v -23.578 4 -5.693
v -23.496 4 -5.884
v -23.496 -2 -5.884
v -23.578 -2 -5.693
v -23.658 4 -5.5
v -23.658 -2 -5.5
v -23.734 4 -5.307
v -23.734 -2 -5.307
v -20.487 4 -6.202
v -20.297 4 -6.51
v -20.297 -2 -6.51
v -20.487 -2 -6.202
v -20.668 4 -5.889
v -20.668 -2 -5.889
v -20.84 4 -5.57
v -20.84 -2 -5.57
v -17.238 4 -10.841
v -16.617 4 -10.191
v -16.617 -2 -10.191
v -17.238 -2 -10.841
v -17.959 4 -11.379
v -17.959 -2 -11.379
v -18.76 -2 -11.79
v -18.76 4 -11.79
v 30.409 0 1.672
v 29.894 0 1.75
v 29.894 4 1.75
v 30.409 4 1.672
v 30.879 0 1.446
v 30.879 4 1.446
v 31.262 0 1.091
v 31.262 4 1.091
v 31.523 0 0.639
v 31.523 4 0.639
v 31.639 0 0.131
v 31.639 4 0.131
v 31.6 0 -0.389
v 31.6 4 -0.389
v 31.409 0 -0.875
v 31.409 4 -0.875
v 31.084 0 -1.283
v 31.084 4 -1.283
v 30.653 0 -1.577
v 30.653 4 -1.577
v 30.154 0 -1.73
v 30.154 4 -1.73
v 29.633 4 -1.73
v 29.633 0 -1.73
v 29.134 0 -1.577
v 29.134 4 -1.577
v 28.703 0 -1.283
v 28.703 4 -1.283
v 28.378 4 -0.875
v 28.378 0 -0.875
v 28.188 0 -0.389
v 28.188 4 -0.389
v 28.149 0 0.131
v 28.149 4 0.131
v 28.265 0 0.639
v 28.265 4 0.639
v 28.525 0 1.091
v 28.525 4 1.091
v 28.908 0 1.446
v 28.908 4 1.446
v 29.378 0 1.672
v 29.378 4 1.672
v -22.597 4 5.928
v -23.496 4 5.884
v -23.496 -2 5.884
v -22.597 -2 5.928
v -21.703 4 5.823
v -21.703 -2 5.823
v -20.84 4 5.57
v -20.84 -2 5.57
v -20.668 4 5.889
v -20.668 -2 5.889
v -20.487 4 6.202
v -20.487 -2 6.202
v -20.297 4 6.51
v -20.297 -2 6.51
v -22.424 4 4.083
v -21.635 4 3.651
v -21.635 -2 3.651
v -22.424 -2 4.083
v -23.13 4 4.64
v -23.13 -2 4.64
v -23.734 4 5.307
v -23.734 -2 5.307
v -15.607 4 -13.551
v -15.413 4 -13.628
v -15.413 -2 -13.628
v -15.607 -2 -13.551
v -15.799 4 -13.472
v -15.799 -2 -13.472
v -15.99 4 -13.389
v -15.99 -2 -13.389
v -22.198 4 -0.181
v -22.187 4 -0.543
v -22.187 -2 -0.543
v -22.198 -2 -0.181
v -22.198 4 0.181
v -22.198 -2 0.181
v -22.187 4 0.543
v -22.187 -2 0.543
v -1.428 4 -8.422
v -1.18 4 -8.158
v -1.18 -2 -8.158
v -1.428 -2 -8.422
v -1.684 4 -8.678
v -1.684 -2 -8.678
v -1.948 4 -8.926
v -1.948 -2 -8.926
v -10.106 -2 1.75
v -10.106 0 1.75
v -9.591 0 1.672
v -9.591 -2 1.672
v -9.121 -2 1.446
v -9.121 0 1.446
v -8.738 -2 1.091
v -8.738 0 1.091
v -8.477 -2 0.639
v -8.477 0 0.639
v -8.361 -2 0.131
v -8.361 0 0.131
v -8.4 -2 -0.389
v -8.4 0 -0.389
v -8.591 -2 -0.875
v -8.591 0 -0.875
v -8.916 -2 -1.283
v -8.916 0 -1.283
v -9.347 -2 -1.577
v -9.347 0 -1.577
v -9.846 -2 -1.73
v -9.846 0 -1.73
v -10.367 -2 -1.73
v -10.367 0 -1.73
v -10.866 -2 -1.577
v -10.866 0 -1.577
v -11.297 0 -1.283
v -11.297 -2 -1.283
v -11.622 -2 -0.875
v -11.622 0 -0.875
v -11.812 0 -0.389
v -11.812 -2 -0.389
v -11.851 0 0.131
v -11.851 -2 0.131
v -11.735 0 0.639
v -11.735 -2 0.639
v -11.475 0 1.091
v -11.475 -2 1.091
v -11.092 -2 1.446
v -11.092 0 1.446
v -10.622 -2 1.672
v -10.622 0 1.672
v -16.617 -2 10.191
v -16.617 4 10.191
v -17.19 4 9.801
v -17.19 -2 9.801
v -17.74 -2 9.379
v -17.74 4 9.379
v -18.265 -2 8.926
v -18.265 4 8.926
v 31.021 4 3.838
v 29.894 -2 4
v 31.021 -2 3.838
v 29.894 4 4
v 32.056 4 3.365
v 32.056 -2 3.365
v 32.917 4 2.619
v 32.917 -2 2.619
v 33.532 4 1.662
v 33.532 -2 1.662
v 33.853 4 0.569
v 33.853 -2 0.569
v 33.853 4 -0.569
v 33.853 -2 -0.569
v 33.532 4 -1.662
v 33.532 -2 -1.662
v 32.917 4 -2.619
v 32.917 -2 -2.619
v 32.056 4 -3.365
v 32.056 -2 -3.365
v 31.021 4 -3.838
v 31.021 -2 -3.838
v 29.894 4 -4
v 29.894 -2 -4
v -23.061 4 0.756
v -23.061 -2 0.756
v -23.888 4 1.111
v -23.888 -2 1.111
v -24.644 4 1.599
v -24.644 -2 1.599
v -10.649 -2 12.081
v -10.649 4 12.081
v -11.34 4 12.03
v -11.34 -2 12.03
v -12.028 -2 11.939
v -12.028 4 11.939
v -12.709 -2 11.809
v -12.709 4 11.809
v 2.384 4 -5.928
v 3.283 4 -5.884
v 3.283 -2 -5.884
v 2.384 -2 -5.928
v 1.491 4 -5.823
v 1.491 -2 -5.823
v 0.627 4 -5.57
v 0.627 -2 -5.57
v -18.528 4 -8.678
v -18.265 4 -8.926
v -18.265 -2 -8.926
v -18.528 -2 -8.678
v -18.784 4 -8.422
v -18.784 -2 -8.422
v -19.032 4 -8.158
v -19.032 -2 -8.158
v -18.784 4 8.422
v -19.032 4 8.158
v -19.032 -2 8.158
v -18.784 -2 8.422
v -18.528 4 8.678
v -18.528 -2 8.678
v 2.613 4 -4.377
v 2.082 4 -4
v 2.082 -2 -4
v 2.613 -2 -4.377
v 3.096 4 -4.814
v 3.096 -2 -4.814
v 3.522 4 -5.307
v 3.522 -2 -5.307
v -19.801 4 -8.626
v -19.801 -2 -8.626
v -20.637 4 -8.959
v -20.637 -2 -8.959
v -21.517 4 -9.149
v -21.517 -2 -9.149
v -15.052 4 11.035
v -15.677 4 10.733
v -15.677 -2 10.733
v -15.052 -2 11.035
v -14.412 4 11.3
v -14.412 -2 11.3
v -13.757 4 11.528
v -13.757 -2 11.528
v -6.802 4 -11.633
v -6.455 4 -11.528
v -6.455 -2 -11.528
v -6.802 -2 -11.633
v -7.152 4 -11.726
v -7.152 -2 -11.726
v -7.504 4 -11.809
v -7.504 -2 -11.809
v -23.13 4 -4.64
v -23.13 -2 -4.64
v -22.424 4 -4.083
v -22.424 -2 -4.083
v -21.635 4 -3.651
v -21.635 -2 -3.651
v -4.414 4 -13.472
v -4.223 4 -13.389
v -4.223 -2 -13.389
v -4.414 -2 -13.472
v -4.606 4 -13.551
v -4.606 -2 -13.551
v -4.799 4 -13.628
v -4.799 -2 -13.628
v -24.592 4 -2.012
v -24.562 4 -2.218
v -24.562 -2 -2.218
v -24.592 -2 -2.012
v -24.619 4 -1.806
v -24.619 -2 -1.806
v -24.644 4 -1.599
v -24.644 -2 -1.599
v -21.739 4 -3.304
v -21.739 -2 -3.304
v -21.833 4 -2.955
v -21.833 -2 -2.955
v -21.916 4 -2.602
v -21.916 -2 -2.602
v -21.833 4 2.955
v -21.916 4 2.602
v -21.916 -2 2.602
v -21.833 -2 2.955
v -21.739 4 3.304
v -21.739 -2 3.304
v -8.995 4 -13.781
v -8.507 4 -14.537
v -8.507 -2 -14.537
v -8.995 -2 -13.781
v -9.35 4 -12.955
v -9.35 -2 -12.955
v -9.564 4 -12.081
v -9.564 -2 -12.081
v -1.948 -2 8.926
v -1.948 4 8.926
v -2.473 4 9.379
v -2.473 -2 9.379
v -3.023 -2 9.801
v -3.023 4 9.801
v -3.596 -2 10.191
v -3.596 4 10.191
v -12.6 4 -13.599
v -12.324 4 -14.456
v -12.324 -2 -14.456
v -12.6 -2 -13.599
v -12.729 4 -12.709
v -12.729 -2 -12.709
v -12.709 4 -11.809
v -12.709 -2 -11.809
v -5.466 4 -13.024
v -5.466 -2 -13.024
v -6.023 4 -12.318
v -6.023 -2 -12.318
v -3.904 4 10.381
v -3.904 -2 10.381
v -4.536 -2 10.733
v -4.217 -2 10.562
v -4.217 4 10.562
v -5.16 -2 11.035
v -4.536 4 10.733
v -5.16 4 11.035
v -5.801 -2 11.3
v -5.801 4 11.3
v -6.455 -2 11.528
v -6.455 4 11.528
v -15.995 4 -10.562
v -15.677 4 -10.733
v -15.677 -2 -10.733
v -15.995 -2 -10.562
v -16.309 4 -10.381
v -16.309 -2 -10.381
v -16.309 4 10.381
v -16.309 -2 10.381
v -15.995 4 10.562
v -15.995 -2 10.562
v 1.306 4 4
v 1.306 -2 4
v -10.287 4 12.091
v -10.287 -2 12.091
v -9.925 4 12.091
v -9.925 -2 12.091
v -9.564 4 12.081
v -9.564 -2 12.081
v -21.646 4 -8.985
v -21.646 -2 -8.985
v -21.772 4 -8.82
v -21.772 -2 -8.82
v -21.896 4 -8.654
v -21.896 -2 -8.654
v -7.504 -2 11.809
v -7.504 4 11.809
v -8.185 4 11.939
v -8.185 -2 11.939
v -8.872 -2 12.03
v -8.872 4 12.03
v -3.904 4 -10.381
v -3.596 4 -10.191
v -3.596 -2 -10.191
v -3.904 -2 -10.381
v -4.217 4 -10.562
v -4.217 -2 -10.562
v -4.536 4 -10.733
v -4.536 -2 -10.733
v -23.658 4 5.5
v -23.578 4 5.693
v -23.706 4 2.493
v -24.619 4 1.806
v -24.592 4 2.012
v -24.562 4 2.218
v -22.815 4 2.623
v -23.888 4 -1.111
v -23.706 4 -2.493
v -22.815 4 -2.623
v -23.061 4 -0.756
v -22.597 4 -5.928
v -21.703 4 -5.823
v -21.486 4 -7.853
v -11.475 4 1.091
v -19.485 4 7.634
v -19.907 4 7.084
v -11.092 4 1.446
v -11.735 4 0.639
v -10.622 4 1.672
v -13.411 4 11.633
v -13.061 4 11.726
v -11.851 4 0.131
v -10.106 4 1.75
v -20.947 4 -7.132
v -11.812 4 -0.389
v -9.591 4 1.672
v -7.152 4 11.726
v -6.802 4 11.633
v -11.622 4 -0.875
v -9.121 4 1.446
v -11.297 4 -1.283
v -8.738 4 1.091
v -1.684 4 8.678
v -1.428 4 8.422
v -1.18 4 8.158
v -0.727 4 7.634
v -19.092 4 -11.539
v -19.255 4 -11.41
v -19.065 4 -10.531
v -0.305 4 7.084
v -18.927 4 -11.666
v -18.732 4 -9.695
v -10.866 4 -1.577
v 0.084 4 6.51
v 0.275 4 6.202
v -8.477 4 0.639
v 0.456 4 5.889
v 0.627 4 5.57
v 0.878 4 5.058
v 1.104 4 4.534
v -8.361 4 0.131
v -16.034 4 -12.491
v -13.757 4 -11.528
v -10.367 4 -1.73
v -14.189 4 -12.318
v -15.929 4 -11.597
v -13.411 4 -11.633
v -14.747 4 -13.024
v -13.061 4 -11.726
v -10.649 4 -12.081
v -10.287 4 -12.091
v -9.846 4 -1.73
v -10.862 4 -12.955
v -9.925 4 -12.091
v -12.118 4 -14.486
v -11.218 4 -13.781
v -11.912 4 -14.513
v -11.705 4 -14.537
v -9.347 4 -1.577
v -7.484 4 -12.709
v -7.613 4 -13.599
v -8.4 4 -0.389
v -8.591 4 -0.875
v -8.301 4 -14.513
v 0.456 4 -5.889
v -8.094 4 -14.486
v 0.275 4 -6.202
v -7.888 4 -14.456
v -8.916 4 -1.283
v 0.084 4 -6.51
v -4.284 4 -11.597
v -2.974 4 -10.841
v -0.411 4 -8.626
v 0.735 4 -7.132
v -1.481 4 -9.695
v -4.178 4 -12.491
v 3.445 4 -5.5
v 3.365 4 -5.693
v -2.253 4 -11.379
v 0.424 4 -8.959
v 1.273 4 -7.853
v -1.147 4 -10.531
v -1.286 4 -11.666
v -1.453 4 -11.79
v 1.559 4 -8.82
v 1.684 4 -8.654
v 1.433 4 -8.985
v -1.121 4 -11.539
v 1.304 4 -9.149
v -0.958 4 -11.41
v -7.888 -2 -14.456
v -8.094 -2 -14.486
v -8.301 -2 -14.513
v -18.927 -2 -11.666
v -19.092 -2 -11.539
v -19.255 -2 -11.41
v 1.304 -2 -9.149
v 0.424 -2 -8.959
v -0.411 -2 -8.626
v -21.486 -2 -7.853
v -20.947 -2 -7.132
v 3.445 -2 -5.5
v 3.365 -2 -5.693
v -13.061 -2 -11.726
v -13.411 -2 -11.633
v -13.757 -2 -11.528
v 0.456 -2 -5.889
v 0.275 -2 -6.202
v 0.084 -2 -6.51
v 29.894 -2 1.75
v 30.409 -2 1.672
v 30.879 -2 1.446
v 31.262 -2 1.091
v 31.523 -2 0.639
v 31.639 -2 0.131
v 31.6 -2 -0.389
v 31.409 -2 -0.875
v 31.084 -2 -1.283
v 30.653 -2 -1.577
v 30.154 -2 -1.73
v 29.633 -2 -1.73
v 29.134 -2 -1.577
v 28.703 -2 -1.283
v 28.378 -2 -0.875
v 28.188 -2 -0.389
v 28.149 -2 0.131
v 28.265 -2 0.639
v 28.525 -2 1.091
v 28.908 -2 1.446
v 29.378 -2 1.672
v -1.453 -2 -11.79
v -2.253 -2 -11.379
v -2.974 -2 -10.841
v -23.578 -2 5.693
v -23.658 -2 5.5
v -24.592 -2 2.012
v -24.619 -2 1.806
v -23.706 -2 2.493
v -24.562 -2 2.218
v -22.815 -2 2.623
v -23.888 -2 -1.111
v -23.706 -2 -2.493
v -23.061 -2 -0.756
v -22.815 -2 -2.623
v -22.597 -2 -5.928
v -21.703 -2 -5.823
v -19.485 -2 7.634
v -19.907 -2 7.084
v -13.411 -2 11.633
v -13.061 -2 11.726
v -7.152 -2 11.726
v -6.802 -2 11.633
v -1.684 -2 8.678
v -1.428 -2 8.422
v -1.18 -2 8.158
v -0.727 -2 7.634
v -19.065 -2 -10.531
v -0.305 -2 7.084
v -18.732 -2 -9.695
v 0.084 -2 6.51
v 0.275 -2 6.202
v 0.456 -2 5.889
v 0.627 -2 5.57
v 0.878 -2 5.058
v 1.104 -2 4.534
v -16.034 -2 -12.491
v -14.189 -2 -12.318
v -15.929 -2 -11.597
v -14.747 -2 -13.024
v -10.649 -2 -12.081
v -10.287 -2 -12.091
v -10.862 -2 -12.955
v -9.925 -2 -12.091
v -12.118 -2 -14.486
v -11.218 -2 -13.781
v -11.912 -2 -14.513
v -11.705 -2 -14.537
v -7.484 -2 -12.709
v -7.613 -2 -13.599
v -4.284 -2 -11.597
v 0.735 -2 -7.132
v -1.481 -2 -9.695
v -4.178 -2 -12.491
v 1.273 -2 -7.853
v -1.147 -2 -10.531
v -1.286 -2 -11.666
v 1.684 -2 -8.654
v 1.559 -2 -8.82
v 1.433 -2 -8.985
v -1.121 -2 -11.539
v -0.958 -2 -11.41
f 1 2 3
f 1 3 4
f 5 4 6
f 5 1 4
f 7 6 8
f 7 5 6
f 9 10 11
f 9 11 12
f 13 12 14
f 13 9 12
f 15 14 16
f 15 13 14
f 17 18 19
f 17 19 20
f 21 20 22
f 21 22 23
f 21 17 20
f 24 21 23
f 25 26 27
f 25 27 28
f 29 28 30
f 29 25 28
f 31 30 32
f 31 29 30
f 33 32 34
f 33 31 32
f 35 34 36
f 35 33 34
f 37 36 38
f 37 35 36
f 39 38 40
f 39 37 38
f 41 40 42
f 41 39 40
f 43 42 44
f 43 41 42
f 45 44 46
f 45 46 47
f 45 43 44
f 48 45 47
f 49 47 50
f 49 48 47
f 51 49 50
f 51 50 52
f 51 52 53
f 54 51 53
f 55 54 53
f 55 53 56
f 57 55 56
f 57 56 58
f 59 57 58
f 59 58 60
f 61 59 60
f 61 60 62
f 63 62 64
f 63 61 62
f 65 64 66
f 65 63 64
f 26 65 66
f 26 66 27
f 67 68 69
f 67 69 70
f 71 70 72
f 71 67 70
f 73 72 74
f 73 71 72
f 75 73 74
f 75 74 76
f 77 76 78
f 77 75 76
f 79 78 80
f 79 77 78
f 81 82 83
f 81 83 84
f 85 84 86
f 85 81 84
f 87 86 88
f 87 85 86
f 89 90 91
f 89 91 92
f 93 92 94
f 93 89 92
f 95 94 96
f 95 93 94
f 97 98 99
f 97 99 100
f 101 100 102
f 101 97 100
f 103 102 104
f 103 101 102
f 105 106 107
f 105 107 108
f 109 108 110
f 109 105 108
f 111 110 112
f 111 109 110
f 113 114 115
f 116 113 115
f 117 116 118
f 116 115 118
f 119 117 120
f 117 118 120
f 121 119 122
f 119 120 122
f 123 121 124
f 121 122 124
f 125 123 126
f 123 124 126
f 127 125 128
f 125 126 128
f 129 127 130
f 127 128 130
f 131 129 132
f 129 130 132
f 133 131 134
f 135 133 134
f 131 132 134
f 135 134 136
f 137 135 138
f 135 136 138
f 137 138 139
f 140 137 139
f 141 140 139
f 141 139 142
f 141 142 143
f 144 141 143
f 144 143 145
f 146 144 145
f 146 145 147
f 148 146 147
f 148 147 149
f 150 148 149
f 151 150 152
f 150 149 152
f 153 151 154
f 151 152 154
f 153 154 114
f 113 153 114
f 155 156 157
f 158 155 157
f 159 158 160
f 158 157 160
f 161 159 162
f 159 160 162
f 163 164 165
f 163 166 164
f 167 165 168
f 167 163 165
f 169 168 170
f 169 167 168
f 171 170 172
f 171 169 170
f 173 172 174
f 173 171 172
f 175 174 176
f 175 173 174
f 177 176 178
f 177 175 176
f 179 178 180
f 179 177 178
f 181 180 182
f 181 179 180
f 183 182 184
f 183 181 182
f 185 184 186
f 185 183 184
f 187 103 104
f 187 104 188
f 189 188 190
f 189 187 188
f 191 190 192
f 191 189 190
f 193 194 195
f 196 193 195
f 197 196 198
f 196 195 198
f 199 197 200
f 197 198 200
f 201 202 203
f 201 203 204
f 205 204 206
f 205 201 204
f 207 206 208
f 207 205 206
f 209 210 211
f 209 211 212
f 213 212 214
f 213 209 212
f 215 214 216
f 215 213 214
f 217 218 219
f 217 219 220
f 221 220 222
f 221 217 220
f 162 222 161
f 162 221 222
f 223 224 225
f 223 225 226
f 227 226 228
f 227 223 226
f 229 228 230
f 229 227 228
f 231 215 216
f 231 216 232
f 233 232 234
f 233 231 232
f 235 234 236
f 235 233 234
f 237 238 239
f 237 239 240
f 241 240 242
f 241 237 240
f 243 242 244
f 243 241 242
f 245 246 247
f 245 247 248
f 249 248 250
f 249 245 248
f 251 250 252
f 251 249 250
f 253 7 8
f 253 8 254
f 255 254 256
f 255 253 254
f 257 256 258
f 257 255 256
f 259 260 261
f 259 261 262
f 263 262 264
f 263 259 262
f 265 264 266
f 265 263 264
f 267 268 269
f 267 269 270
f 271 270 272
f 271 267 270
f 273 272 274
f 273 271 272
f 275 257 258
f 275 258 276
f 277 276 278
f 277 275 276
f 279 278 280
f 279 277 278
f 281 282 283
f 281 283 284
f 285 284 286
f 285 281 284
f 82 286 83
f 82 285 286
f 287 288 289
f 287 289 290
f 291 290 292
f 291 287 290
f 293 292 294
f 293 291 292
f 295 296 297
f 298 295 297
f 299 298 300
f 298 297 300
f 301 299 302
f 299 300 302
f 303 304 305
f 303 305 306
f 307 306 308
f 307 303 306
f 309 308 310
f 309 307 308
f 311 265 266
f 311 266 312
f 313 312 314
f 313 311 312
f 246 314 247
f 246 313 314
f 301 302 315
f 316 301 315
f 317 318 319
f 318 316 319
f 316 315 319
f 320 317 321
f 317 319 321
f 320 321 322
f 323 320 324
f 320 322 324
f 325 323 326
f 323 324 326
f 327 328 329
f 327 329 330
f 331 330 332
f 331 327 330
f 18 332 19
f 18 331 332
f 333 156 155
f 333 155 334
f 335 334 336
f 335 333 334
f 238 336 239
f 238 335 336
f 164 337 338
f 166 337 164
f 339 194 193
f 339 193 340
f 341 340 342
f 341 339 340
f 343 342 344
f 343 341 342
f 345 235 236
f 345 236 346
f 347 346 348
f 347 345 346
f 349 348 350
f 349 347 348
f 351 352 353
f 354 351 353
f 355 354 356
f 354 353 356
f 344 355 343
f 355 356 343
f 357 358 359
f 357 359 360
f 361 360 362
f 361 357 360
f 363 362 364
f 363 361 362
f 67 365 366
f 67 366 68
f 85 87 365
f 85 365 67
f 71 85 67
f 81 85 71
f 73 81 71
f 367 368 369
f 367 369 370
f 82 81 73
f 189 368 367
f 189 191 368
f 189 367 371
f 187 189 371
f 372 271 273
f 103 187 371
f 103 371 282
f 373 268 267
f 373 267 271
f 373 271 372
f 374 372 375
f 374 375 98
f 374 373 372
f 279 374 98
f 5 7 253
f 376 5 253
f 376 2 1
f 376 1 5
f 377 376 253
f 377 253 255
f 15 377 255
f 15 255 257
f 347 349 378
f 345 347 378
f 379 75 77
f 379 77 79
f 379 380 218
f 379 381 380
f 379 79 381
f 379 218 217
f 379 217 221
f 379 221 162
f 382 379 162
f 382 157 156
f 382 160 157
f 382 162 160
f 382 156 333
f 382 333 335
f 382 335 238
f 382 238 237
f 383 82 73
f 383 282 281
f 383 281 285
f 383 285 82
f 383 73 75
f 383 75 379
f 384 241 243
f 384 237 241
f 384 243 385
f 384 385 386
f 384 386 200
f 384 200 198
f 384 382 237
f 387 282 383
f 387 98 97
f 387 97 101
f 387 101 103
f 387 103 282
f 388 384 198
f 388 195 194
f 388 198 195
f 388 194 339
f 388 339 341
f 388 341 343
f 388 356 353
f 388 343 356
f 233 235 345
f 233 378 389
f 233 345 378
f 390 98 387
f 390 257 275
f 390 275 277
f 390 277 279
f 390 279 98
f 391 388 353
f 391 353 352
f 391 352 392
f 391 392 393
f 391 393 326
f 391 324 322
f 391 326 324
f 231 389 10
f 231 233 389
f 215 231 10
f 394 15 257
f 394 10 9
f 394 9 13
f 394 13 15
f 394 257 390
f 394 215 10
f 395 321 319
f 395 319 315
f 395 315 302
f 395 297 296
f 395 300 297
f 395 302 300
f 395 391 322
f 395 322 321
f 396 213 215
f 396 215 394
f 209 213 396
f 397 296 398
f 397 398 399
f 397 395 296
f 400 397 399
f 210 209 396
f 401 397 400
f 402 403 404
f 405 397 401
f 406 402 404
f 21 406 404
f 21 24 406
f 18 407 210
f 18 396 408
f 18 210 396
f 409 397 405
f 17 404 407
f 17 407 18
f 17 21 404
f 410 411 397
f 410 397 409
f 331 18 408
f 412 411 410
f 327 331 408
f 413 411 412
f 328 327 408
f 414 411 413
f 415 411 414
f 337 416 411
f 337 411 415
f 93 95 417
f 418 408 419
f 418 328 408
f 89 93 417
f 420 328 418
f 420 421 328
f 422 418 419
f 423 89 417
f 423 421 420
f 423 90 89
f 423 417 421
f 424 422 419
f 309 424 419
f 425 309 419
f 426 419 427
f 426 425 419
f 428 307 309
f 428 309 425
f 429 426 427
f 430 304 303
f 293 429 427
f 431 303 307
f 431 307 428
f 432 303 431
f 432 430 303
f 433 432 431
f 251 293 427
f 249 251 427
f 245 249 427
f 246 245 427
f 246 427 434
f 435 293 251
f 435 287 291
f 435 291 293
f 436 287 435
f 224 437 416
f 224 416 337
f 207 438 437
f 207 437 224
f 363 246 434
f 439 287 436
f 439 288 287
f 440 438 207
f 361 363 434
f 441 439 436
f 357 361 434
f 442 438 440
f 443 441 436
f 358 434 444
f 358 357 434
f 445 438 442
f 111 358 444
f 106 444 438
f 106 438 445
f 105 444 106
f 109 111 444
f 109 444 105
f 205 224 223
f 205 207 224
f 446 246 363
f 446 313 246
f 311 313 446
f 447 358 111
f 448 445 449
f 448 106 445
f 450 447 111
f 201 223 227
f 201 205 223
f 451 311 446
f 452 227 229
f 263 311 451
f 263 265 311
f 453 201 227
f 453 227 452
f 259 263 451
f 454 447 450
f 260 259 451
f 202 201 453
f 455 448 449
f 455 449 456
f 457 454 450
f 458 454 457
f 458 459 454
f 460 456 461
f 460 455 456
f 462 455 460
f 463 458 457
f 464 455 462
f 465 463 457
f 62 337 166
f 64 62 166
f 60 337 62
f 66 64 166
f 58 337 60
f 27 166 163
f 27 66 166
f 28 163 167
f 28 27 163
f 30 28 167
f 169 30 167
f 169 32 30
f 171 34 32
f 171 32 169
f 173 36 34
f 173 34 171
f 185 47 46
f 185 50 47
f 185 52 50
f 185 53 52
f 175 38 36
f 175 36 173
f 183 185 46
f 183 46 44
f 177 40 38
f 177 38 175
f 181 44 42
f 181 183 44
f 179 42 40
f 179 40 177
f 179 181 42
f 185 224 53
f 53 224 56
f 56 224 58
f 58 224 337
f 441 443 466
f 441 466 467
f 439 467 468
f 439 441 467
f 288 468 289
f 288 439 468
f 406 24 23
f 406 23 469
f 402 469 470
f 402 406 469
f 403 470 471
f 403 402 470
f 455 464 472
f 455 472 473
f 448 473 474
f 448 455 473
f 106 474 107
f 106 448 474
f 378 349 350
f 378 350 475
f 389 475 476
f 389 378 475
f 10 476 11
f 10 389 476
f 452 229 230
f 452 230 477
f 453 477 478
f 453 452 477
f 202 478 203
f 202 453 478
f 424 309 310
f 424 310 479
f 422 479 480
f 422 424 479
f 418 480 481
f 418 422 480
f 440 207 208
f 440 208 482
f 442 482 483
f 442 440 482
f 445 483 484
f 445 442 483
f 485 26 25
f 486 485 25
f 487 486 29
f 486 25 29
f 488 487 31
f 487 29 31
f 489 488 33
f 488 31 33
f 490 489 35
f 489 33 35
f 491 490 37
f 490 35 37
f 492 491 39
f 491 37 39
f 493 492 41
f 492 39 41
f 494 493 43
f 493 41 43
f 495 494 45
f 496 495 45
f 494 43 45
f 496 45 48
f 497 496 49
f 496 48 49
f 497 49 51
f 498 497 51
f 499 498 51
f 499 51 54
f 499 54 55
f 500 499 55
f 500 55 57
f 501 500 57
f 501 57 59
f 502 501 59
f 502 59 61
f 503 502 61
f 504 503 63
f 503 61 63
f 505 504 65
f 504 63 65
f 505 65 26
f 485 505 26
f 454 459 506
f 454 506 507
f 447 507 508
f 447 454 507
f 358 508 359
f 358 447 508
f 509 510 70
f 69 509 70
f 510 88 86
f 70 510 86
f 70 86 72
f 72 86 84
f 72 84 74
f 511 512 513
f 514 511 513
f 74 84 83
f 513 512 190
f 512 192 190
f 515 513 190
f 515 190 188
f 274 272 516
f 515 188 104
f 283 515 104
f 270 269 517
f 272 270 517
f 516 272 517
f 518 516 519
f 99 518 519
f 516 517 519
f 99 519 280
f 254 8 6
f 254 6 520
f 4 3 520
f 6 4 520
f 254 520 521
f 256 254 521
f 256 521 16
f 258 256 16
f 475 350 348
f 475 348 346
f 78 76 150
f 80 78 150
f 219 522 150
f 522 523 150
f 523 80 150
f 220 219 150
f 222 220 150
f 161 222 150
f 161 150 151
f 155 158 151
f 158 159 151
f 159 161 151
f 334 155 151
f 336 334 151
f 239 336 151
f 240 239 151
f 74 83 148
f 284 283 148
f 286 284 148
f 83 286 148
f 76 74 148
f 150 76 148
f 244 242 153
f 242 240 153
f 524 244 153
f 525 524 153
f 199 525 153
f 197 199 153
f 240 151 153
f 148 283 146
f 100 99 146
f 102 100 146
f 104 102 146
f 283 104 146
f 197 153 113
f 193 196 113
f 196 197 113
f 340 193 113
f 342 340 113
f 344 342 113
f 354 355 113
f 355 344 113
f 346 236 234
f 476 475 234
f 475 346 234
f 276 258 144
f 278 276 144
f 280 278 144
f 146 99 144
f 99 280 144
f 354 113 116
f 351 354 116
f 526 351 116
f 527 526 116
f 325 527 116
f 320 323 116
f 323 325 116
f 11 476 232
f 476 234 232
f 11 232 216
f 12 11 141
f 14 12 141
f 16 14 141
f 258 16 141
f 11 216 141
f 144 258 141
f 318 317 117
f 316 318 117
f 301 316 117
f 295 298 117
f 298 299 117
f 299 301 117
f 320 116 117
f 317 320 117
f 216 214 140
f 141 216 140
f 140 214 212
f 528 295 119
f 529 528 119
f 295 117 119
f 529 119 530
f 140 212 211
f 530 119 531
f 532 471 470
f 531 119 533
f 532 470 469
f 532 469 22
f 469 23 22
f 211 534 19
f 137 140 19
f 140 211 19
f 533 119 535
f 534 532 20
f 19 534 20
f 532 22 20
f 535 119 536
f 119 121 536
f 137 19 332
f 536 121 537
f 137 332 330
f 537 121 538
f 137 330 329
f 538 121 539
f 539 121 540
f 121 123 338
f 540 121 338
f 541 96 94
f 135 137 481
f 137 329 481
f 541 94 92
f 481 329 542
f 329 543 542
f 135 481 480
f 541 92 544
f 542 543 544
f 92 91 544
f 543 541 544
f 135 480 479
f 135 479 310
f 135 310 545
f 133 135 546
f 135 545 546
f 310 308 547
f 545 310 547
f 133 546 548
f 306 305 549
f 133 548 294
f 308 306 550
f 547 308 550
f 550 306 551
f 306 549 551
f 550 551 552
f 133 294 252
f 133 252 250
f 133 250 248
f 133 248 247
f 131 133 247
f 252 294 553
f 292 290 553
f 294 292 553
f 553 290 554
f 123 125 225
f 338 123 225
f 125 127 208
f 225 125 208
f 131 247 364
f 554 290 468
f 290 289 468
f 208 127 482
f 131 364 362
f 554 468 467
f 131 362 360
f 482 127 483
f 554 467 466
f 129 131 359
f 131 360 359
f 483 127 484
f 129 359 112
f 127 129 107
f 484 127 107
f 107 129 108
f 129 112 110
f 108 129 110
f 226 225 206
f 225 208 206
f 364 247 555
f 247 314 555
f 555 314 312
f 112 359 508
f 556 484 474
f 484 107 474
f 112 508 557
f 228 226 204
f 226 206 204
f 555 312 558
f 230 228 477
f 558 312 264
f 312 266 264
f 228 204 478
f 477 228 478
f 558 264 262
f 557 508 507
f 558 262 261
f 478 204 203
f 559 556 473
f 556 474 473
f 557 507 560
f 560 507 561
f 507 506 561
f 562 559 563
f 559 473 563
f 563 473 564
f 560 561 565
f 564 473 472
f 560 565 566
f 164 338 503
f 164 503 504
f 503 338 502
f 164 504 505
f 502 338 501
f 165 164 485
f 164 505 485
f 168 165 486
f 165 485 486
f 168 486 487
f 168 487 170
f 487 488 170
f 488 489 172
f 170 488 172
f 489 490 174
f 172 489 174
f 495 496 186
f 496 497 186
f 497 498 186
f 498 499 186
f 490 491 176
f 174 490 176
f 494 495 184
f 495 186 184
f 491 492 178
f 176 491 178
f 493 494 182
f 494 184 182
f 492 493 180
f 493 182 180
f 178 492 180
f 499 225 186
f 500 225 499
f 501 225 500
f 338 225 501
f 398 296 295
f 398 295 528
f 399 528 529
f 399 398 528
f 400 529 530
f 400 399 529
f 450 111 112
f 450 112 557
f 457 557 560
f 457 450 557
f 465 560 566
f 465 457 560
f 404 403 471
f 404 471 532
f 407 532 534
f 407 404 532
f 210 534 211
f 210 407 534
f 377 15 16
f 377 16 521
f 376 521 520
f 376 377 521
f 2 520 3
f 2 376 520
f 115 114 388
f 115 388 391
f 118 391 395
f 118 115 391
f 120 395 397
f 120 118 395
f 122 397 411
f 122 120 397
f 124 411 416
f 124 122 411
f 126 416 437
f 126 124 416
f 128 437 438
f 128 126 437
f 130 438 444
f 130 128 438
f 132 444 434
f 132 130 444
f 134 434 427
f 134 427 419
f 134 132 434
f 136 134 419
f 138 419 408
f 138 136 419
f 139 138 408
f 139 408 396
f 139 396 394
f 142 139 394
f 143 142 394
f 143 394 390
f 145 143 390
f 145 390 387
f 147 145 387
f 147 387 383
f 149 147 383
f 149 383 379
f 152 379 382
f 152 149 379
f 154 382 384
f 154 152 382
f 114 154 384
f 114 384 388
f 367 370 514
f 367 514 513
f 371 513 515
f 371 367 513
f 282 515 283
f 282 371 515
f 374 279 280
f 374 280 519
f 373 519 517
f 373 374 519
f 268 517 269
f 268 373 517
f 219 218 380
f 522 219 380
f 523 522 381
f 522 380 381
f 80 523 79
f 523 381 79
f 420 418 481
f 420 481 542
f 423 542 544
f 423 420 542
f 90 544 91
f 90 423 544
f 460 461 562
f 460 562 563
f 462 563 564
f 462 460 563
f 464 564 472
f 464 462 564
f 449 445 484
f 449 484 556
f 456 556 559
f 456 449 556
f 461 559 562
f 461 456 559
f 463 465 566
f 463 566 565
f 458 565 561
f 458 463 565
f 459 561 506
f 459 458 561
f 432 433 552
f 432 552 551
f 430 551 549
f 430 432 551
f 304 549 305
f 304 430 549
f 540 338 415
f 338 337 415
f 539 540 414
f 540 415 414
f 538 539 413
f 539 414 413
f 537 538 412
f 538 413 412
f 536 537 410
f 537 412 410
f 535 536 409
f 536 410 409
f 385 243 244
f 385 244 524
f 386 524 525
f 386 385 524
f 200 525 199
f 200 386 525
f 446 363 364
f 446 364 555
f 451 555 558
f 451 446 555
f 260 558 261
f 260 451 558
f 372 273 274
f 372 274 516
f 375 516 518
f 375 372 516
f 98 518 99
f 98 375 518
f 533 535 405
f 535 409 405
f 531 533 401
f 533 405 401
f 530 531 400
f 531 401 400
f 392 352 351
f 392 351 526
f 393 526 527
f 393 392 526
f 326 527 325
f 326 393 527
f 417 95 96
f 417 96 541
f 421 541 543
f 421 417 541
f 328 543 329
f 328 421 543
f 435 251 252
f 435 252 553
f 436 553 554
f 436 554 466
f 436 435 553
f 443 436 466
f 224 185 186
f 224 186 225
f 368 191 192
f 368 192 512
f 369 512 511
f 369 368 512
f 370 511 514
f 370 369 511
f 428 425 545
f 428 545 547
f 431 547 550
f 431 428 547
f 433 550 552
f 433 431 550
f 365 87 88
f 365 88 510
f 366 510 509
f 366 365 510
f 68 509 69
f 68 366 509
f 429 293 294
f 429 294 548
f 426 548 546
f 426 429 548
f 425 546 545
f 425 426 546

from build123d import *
from build123d.topology import SkipClean

# Parameters (mm, degrees)
SKETCH1_R           = 1.75
BOSS_EXTRUDE1_DEPTH = 4
CUT_EXTRUDE1_START  = -10
CUT_EXTRUDE1_DEPTH  = 10
MOVE_FACE1_BY       = 2


with BuildPart() as part:
    # Sketch1 → Boss-Extrude1 (new body)
    with BuildSketch(Plane(origin=(0, 0, 0), x_dir=(1, 0, 0), z_dir=(0, 1, 0))):
        with BuildLine():
            Line((29.893657446, 4), (2.081641936, 4))
            ThreePointArc((2.081641936, 4), (2.861028333, 4.588201733), (3.521749436, 5.30713988))
            ThreePointArc((3.521749436, 5.30713988), (3.405395609, 5.596745198), (3.282888305, 5.883801663))
            ThreePointArc((3.282888305, 5.883801663), (1.93527598, 5.894040025), (0.627094961, 5.57027124))
            ThreePointArc((0.627094961, 5.57027124), (0.366286148, 6.046375), (0.084372603, 6.510293938))
            ThreePointArc((0.084372603, 6.510293938), (1.018855105, 7.48132754), (1.683794586, 8.65351323))
            ThreePointArc((1.683794586, 8.65351323), (1.496450048, 8.903135899), (1.303821399, 9.148703928))
            ThreePointArc((1.303821399, 9.148703928), (-0.000522033, 8.809805691), (-1.180330337, 8.158486898))
            ThreePointArc((-1.180330337, 8.158486898), (-1.555477026, 8.550865528), (-1.947855656, 8.926012217))
            ThreePointArc((-1.947855656, 8.926012217), (-1.296536862, 10.105820521), (-0.957638625, 11.410163953))
            ThreePointArc((-0.957638625, 11.410163953), (-1.203206655, 11.602792602), (-1.452829324, 11.79013714))
            ThreePointArc((-1.452829324, 11.79013714), (-2.625015014, 11.125197659), (-3.596048616, 10.190715157))
            ThreePointArc((-3.596048616, 10.190715157), (-4.059967554, 10.472628702), (-4.536071314, 10.733437515))
            ThreePointArc((-4.536071314, 10.733437515), (-4.212302529, 12.041618533), (-4.222540891, 13.389230859))
            ThreePointArc((-4.222540891, 13.389230859), (-4.509597355, 13.511738163), (-4.799202674, 13.62809199))
            ThreePointArc((-4.799202674, 13.62809199), (-5.759348103, 12.682425791), (-6.455432668, 11.528463019))
            ThreePointArc((-6.455432668, 11.528463019), (-6.976508546, 11.680699536), (-7.503891752, 11.809396783))
            ThreePointArc((-7.503891752, 11.809396783), (-7.529737283, 13.156800143), (-7.888414517, 14.455843809))
            ThreePointArc((-7.888414517, 14.455843809), (-8.197396993, 14.499881098), (-8.507248835, 14.537314892))
            ThreePointArc((-8.507248835, 14.537314892), (-9.18992168, 13.375367565), (-9.563620196, 12.080565177))
            ThreePointArc((-9.563620196, 12.080565177), (-10.106342554, 12.09275), (-10.649064912, 12.080565177))
            ThreePointArc((-10.649064912, 12.080565177), (-11.022763428, 13.375367565), (-11.705436272, 14.537314892))
            ThreePointArc((-11.705436272, 14.537314892), (-12.015288115, 14.499881098), (-12.324270591, 14.455843809))
            ThreePointArc((-12.324270591, 14.455843809), (-12.682947825, 13.156800143), (-12.708793355, 11.809396783))
            ThreePointArc((-12.708793355, 11.809396783), (-13.236176561, 11.680699536), (-13.757252439, 11.528463019))
            ThreePointArc((-13.757252439, 11.528463019), (-14.453337005, 12.682425791), (-15.413482434, 13.62809199))
            ThreePointArc((-15.413482434, 13.62809199), (-15.703087752, 13.511738163), (-15.990144217, 13.389230859))
            ThreePointArc((-15.990144217, 13.389230859), (-16.000382579, 12.041618533), (-15.676613793, 10.733437515))
            ThreePointArc((-15.676613793, 10.733437515), (-16.152717554, 10.472628702), (-16.616636492, 10.190715157))
            ThreePointArc((-16.616636492, 10.190715157), (-17.587670094, 11.125197659), (-18.759855783, 11.79013714))
            ThreePointArc((-18.759855783, 11.79013714), (-19.009478453, 11.602792602), (-19.255046482, 11.410163953))
            ThreePointArc((-19.255046482, 11.410163953), (-18.916148245, 10.105820521), (-18.264829452, 8.926012217))
            ThreePointArc((-18.264829452, 8.926012217), (-18.657208082, 8.550865528), (-19.032354771, 8.158486898))
            ThreePointArc((-19.032354771, 8.158486898), (-20.212163074, 8.809805691), (-21.516506507, 9.148703928))
            ThreePointArc((-21.516506507, 9.148703928), (-21.709135156, 8.903135899), (-21.896479694, 8.65351323))
            ThreePointArc((-21.896479694, 8.65351323), (-21.231540213, 7.48132754), (-20.297057711, 6.510293938))
            ThreePointArc((-20.297057711, 6.510293938), (-20.578971255, 6.046375), (-20.839780068, 5.57027124))
            ThreePointArc((-20.839780068, 5.57027124), (-22.147961087, 5.894040025), (-23.495573413, 5.883801663))
            ThreePointArc((-23.495573413, 5.883801663), (-23.618080717, 5.596745198), (-23.734434544, 5.30713988))
            ThreePointArc((-23.734434544, 5.30713988), (-22.788768345, 4.346994451), (-21.634805572, 3.650909885))
            ThreePointArc((-21.634805572, 3.650909885), (-21.78704209, 3.129834008), (-21.915739337, 2.602450802))
            ThreePointArc((-21.915739337, 2.602450802), (-23.263142697, 2.576605271), (-24.562186363, 2.217928037))
            ThreePointArc((-24.562186363, 2.217928037), (-24.606223651, 1.908945561), (-24.643657446, 1.599093719))
            ThreePointArc((-24.643657446, 1.599093719), (-23.481710119, 0.916420874), (-22.186907731, 0.542722358))
            ThreePointArc((-22.186907731, 0.542722358), (-22.199092554, 0), (-22.186907731, -0.542722358))
            ThreePointArc((-22.186907731, -0.542722358), (-23.481710119, -0.916420874), (-24.643657446, -1.599093719))
            ThreePointArc((-24.643657446, -1.599093719), (-24.606223651, -1.908945561), (-24.562186363, -2.217928037))
            ThreePointArc((-24.562186363, -2.217928037), (-23.263142697, -2.576605271), (-21.915739337, -2.602450802))
            ThreePointArc((-21.915739337, -2.602450802), (-21.78704209, -3.129834008), (-21.634805572, -3.650909885))
            ThreePointArc((-21.634805572, -3.650909885), (-22.788768345, -4.346994451), (-23.734434544, -5.30713988))
            ThreePointArc((-23.734434544, -5.30713988), (-23.618080717, -5.596745198), (-23.495573413, -5.883801663))
            ThreePointArc((-23.495573413, -5.883801663), (-22.147961087, -5.894040025), (-20.839780068, -5.57027124))
            ThreePointArc((-20.839780068, -5.57027124), (-20.578971255, -6.046375), (-20.297057711, -6.510293938))
            ThreePointArc((-20.297057711, -6.510293938), (-21.231540213, -7.48132754), (-21.896479694, -8.65351323))
            ThreePointArc((-21.896479694, -8.65351323), (-21.709135156, -8.903135899), (-21.516506507, -9.148703928))
            ThreePointArc((-21.516506507, -9.148703928), (-20.212163074, -8.809805691), (-19.032354771, -8.158486898))
            ThreePointArc((-19.032354771, -8.158486898), (-18.657208082, -8.550865528), (-18.264829452, -8.926012217))
            ThreePointArc((-18.264829452, -8.926012217), (-18.916148245, -10.105820521), (-19.255046482, -11.410163953))
            ThreePointArc((-19.255046482, -11.410163953), (-19.009478453, -11.602792602), (-18.759855783, -11.79013714))
            ThreePointArc((-18.759855783, -11.79013714), (-17.587670094, -11.125197659), (-16.616636492, -10.190715157))
            ThreePointArc((-16.616636492, -10.190715157), (-16.152717554, -10.472628702), (-15.676613793, -10.733437515))
            ThreePointArc((-15.676613793, -10.733437515), (-16.000382579, -12.041618533), (-15.990144217, -13.389230859))
            ThreePointArc((-15.990144217, -13.389230859), (-15.703087752, -13.511738163), (-15.413482434, -13.62809199))
            ThreePointArc((-15.413482434, -13.62809199), (-14.453337005, -12.682425791), (-13.757252439, -11.528463019))
            ThreePointArc((-13.757252439, -11.528463019), (-13.236176561, -11.680699536), (-12.708793355, -11.809396783))
            ThreePointArc((-12.708793355, -11.809396783), (-12.682947825, -13.156800143), (-12.324270591, -14.455843809))
            ThreePointArc((-12.324270591, -14.455843809), (-12.015288115, -14.499881098), (-11.705436272, -14.537314892))
            ThreePointArc((-11.705436272, -14.537314892), (-11.022763428, -13.375367565), (-10.649064912, -12.080565177))
            ThreePointArc((-10.649064912, -12.080565177), (-10.106342554, -12.09275), (-9.563620196, -12.080565177))
            ThreePointArc((-9.563620196, -12.080565177), (-9.18992168, -13.375367565), (-8.507248835, -14.537314892))
            ThreePointArc((-8.507248835, -14.537314892), (-8.197396993, -14.499881098), (-7.888414517, -14.455843809))
            ThreePointArc((-7.888414517, -14.455843809), (-7.529737283, -13.156800143), (-7.503891752, -11.809396783))
            ThreePointArc((-7.503891752, -11.809396783), (-6.976508546, -11.680699536), (-6.455432668, -11.528463019))
            ThreePointArc((-6.455432668, -11.528463019), (-5.759348103, -12.682425791), (-4.799202674, -13.62809199))
            ThreePointArc((-4.799202674, -13.62809199), (-4.509597355, -13.511738163), (-4.222540891, -13.389230859))
            ThreePointArc((-4.222540891, -13.389230859), (-4.212302529, -12.041618533), (-4.536071314, -10.733437515))
            ThreePointArc((-4.536071314, -10.733437515), (-4.059967554, -10.472628702), (-3.596048616, -10.190715157))
            ThreePointArc((-3.596048616, -10.190715157), (-2.625015014, -11.125197659), (-1.452829324, -11.79013714))
            ThreePointArc((-1.452829324, -11.79013714), (-1.203206655, -11.602792602), (-0.957638625, -11.410163953))
            ThreePointArc((-0.957638625, -11.410163953), (-1.296536862, -10.105820521), (-1.947855656, -8.926012217))
            ThreePointArc((-1.947855656, -8.926012217), (-1.555477026, -8.550865528), (-1.180330337, -8.158486898))
            ThreePointArc((-1.180330337, -8.158486898), (-0.000522033, -8.809805691), (1.303821399, -9.148703928))
            ThreePointArc((1.303821399, -9.148703928), (1.496450048, -8.903135899), (1.683794586, -8.65351323))
            ThreePointArc((1.683794586, -8.65351323), (1.018855105, -7.48132754), (0.084372603, -6.510293938))
            ThreePointArc((0.084372603, -6.510293938), (0.366286148, -6.046375), (0.627094961, -5.57027124))
            ThreePointArc((0.627094961, -5.57027124), (1.93527598, -5.894040025), (3.282888305, -5.883801663))
            ThreePointArc((3.282888305, -5.883801663), (3.405395609, -5.596745198), (3.521749436, -5.30713988))
            ThreePointArc((3.521749436, -5.30713988), (2.861028333, -4.588201733), (2.081641936, -4))
            Line((2.081641936, -4), (29.893658255, -4))
            ThreePointArc((29.893658255, -4), (33.893657446, 4.04e-07), (29.893657446, 4))
        make_face()
        with Locations(Location((-10.106342554, 0, 0), (0, 0, 270))):
            Circle(SKETCH1_R, mode=Mode.SUBTRACT)
        with Locations(Location((29.893657446, 0, 0), (0, 0, 270))):
            Circle(SKETCH1_R, mode=Mode.SUBTRACT)
    extrude(amount=BOSS_EXTRUDE1_DEPTH)

    # Sketch2 → Cut-Extrude1 (cut)
    with SkipClean():  # the faces are left unmerged after this step: merging them gives an invalid solid
        with BuildSketch(Plane(origin=(0, 4, 0), x_dir=(1, 0, 0), z_dir=(0, 1, 0)).offset(CUT_EXTRUDE1_START)):
            with BuildLine():
                ThreePointArc((-21.516506507, -9.148703928), (-20.212163074, -8.809805691), (-19.032354771, -8.158486898))
                ThreePointArc((-19.032354771, -8.158486898), (-19.70016616, -7.361599771), (-20.297057711, -6.510293938))
                ThreePointArc((-20.297057711, -6.510293938), (-21.231540213, -7.48132754), (-21.896479694, -8.65351323))
                ThreePointArc((-21.896479694, -8.65351323), (-21.709135156, -8.903135899), (-21.516506507, -9.148703928))
            make_face()
            with BuildLine():
                ThreePointArc((-18.759855783, -11.79013714), (-17.587670094, -11.125197659), (-16.616636492, -10.190715157))
                ThreePointArc((-16.616636492, -10.190715157), (-17.467942324, -9.593823606), (-18.264829452, -8.926012217))
                ThreePointArc((-18.264829452, -8.926012217), (-18.916148245, -10.105820521), (-19.255046482, -11.410163953))
                ThreePointArc((-19.255046482, -11.410163953), (-19.009478453, -11.602792602), (-18.759855783, -11.79013714))
            make_face()
            with BuildLine():
                ThreePointArc((-15.413482434, -13.62809199), (-14.453337005, -12.682425791), (-13.757252439, -11.528463019))
                ThreePointArc((-13.757252439, -11.528463019), (-14.734037631, -11.172244217), (-15.676613793, -10.733437515))
                ThreePointArc((-15.676613793, -10.733437515), (-16.000382579, -12.041618533), (-15.990144217, -13.389230859))
                ThreePointArc((-15.990144217, -13.389230859), (-15.703087752, -13.511738163), (-15.413482434, -13.62809199))
            make_face()
            with BuildLine():
                ThreePointArc((-11.705436272, -14.537314892), (-11.022763428, -13.375367565), (-10.649064912, -12.080565177))
                ThreePointArc((-10.649064912, -12.080565177), (-11.684763165, -11.989294847), (-12.708793355, -11.809396783))
                ThreePointArc((-12.708793355, -11.809396783), (-12.682947825, -13.156800143), (-12.324270591, -14.455843809))
                ThreePointArc((-12.324270591, -14.455843809), (-12.015288115, -14.499881098), (-11.705436272, -14.537314892))
            make_face()
            with BuildLine():
                ThreePointArc((-7.888414517, -14.455843809), (-7.529737283, -13.156800143), (-7.503891752, -11.809396783))
                ThreePointArc((-7.503891752, -11.809396783), (-8.527921943, -11.989294847), (-9.563620196, -12.080565177))
                ThreePointArc((-9.563620196, -12.080565177), (-9.18992168, -13.375367565), (-8.507248835, -14.537314892))
                ThreePointArc((-8.507248835, -14.537314892), (-8.197396993, -14.499881098), (-7.888414517, -14.455843809))
            make_face()
            with BuildLine():
                ThreePointArc((-4.222540891, -13.389230859), (-4.212302529, -12.041618533), (-4.536071314, -10.733437515))
                ThreePointArc((-4.536071314, -10.733437515), (-5.478647477, -11.172244217), (-6.455432668, -11.528463019))
                ThreePointArc((-6.455432668, -11.528463019), (-5.759348103, -12.682425791), (-4.799202674, -13.62809199))
                ThreePointArc((-4.799202674, -13.62809199), (-4.509597355, -13.511738163), (-4.222540891, -13.389230859))
            make_face()
            with BuildLine():
                ThreePointArc((-0.957638625, -11.410163953), (-1.296536862, -10.105820521), (-1.947855656, -8.926012217))
                ThreePointArc((-1.947855656, -8.926012217), (-2.744742783, -9.593823606), (-3.596048616, -10.190715157))
                ThreePointArc((-3.596048616, -10.190715157), (-2.625015014, -11.125197659), (-1.452829324, -11.79013714))
                ThreePointArc((-1.452829324, -11.79013714), (-1.203206655, -11.602792602), (-0.957638625, -11.410163953))
            make_face()
            with BuildLine():
                ThreePointArc((1.683794586, -8.65351323), (1.018855105, -7.48132754), (0.084372603, -6.510293938))
                ThreePointArc((0.084372603, -6.510293938), (-0.512518948, -7.361599771), (-1.180330337, -8.158486898))
                ThreePointArc((-1.180330337, -8.158486898), (-0.000522033, -8.809805691), (1.303821399, -9.148703928))
                ThreePointArc((1.303821399, -9.148703928), (1.496450048, -8.903135899), (1.683794586, -8.65351323))
            make_face()
            with BuildLine():
                ThreePointArc((3.521749436, -5.30713988), (2.861028333, -4.588201733), (2.081641936, -4))
                Line((2.081641936, -4), (1.305695063, -4))
                ThreePointArc((1.305695063, -4), (0.994195953, -4.797149927), (0.627094961, -5.57027124))
                ThreePointArc((0.627094961, -5.57027124), (1.93527598, -5.894040025), (3.282888305, -5.883801663))
                ThreePointArc((3.282888305, -5.883801663), (3.405395609, -5.596745198), (3.521749436, -5.30713988))
            make_face()
        extrude(amount=CUT_EXTRUDE1_DEPTH, mode=Mode.SUBTRACT)

    # Move Face1: a face moved outward by 2.0
    extrude(part.faces().sort_by_distance((-1.561241714, 0, -0.498914488))[0], amount=MOVE_FACE1_BY, dir=(0, -1, 0))


solid = part.part
